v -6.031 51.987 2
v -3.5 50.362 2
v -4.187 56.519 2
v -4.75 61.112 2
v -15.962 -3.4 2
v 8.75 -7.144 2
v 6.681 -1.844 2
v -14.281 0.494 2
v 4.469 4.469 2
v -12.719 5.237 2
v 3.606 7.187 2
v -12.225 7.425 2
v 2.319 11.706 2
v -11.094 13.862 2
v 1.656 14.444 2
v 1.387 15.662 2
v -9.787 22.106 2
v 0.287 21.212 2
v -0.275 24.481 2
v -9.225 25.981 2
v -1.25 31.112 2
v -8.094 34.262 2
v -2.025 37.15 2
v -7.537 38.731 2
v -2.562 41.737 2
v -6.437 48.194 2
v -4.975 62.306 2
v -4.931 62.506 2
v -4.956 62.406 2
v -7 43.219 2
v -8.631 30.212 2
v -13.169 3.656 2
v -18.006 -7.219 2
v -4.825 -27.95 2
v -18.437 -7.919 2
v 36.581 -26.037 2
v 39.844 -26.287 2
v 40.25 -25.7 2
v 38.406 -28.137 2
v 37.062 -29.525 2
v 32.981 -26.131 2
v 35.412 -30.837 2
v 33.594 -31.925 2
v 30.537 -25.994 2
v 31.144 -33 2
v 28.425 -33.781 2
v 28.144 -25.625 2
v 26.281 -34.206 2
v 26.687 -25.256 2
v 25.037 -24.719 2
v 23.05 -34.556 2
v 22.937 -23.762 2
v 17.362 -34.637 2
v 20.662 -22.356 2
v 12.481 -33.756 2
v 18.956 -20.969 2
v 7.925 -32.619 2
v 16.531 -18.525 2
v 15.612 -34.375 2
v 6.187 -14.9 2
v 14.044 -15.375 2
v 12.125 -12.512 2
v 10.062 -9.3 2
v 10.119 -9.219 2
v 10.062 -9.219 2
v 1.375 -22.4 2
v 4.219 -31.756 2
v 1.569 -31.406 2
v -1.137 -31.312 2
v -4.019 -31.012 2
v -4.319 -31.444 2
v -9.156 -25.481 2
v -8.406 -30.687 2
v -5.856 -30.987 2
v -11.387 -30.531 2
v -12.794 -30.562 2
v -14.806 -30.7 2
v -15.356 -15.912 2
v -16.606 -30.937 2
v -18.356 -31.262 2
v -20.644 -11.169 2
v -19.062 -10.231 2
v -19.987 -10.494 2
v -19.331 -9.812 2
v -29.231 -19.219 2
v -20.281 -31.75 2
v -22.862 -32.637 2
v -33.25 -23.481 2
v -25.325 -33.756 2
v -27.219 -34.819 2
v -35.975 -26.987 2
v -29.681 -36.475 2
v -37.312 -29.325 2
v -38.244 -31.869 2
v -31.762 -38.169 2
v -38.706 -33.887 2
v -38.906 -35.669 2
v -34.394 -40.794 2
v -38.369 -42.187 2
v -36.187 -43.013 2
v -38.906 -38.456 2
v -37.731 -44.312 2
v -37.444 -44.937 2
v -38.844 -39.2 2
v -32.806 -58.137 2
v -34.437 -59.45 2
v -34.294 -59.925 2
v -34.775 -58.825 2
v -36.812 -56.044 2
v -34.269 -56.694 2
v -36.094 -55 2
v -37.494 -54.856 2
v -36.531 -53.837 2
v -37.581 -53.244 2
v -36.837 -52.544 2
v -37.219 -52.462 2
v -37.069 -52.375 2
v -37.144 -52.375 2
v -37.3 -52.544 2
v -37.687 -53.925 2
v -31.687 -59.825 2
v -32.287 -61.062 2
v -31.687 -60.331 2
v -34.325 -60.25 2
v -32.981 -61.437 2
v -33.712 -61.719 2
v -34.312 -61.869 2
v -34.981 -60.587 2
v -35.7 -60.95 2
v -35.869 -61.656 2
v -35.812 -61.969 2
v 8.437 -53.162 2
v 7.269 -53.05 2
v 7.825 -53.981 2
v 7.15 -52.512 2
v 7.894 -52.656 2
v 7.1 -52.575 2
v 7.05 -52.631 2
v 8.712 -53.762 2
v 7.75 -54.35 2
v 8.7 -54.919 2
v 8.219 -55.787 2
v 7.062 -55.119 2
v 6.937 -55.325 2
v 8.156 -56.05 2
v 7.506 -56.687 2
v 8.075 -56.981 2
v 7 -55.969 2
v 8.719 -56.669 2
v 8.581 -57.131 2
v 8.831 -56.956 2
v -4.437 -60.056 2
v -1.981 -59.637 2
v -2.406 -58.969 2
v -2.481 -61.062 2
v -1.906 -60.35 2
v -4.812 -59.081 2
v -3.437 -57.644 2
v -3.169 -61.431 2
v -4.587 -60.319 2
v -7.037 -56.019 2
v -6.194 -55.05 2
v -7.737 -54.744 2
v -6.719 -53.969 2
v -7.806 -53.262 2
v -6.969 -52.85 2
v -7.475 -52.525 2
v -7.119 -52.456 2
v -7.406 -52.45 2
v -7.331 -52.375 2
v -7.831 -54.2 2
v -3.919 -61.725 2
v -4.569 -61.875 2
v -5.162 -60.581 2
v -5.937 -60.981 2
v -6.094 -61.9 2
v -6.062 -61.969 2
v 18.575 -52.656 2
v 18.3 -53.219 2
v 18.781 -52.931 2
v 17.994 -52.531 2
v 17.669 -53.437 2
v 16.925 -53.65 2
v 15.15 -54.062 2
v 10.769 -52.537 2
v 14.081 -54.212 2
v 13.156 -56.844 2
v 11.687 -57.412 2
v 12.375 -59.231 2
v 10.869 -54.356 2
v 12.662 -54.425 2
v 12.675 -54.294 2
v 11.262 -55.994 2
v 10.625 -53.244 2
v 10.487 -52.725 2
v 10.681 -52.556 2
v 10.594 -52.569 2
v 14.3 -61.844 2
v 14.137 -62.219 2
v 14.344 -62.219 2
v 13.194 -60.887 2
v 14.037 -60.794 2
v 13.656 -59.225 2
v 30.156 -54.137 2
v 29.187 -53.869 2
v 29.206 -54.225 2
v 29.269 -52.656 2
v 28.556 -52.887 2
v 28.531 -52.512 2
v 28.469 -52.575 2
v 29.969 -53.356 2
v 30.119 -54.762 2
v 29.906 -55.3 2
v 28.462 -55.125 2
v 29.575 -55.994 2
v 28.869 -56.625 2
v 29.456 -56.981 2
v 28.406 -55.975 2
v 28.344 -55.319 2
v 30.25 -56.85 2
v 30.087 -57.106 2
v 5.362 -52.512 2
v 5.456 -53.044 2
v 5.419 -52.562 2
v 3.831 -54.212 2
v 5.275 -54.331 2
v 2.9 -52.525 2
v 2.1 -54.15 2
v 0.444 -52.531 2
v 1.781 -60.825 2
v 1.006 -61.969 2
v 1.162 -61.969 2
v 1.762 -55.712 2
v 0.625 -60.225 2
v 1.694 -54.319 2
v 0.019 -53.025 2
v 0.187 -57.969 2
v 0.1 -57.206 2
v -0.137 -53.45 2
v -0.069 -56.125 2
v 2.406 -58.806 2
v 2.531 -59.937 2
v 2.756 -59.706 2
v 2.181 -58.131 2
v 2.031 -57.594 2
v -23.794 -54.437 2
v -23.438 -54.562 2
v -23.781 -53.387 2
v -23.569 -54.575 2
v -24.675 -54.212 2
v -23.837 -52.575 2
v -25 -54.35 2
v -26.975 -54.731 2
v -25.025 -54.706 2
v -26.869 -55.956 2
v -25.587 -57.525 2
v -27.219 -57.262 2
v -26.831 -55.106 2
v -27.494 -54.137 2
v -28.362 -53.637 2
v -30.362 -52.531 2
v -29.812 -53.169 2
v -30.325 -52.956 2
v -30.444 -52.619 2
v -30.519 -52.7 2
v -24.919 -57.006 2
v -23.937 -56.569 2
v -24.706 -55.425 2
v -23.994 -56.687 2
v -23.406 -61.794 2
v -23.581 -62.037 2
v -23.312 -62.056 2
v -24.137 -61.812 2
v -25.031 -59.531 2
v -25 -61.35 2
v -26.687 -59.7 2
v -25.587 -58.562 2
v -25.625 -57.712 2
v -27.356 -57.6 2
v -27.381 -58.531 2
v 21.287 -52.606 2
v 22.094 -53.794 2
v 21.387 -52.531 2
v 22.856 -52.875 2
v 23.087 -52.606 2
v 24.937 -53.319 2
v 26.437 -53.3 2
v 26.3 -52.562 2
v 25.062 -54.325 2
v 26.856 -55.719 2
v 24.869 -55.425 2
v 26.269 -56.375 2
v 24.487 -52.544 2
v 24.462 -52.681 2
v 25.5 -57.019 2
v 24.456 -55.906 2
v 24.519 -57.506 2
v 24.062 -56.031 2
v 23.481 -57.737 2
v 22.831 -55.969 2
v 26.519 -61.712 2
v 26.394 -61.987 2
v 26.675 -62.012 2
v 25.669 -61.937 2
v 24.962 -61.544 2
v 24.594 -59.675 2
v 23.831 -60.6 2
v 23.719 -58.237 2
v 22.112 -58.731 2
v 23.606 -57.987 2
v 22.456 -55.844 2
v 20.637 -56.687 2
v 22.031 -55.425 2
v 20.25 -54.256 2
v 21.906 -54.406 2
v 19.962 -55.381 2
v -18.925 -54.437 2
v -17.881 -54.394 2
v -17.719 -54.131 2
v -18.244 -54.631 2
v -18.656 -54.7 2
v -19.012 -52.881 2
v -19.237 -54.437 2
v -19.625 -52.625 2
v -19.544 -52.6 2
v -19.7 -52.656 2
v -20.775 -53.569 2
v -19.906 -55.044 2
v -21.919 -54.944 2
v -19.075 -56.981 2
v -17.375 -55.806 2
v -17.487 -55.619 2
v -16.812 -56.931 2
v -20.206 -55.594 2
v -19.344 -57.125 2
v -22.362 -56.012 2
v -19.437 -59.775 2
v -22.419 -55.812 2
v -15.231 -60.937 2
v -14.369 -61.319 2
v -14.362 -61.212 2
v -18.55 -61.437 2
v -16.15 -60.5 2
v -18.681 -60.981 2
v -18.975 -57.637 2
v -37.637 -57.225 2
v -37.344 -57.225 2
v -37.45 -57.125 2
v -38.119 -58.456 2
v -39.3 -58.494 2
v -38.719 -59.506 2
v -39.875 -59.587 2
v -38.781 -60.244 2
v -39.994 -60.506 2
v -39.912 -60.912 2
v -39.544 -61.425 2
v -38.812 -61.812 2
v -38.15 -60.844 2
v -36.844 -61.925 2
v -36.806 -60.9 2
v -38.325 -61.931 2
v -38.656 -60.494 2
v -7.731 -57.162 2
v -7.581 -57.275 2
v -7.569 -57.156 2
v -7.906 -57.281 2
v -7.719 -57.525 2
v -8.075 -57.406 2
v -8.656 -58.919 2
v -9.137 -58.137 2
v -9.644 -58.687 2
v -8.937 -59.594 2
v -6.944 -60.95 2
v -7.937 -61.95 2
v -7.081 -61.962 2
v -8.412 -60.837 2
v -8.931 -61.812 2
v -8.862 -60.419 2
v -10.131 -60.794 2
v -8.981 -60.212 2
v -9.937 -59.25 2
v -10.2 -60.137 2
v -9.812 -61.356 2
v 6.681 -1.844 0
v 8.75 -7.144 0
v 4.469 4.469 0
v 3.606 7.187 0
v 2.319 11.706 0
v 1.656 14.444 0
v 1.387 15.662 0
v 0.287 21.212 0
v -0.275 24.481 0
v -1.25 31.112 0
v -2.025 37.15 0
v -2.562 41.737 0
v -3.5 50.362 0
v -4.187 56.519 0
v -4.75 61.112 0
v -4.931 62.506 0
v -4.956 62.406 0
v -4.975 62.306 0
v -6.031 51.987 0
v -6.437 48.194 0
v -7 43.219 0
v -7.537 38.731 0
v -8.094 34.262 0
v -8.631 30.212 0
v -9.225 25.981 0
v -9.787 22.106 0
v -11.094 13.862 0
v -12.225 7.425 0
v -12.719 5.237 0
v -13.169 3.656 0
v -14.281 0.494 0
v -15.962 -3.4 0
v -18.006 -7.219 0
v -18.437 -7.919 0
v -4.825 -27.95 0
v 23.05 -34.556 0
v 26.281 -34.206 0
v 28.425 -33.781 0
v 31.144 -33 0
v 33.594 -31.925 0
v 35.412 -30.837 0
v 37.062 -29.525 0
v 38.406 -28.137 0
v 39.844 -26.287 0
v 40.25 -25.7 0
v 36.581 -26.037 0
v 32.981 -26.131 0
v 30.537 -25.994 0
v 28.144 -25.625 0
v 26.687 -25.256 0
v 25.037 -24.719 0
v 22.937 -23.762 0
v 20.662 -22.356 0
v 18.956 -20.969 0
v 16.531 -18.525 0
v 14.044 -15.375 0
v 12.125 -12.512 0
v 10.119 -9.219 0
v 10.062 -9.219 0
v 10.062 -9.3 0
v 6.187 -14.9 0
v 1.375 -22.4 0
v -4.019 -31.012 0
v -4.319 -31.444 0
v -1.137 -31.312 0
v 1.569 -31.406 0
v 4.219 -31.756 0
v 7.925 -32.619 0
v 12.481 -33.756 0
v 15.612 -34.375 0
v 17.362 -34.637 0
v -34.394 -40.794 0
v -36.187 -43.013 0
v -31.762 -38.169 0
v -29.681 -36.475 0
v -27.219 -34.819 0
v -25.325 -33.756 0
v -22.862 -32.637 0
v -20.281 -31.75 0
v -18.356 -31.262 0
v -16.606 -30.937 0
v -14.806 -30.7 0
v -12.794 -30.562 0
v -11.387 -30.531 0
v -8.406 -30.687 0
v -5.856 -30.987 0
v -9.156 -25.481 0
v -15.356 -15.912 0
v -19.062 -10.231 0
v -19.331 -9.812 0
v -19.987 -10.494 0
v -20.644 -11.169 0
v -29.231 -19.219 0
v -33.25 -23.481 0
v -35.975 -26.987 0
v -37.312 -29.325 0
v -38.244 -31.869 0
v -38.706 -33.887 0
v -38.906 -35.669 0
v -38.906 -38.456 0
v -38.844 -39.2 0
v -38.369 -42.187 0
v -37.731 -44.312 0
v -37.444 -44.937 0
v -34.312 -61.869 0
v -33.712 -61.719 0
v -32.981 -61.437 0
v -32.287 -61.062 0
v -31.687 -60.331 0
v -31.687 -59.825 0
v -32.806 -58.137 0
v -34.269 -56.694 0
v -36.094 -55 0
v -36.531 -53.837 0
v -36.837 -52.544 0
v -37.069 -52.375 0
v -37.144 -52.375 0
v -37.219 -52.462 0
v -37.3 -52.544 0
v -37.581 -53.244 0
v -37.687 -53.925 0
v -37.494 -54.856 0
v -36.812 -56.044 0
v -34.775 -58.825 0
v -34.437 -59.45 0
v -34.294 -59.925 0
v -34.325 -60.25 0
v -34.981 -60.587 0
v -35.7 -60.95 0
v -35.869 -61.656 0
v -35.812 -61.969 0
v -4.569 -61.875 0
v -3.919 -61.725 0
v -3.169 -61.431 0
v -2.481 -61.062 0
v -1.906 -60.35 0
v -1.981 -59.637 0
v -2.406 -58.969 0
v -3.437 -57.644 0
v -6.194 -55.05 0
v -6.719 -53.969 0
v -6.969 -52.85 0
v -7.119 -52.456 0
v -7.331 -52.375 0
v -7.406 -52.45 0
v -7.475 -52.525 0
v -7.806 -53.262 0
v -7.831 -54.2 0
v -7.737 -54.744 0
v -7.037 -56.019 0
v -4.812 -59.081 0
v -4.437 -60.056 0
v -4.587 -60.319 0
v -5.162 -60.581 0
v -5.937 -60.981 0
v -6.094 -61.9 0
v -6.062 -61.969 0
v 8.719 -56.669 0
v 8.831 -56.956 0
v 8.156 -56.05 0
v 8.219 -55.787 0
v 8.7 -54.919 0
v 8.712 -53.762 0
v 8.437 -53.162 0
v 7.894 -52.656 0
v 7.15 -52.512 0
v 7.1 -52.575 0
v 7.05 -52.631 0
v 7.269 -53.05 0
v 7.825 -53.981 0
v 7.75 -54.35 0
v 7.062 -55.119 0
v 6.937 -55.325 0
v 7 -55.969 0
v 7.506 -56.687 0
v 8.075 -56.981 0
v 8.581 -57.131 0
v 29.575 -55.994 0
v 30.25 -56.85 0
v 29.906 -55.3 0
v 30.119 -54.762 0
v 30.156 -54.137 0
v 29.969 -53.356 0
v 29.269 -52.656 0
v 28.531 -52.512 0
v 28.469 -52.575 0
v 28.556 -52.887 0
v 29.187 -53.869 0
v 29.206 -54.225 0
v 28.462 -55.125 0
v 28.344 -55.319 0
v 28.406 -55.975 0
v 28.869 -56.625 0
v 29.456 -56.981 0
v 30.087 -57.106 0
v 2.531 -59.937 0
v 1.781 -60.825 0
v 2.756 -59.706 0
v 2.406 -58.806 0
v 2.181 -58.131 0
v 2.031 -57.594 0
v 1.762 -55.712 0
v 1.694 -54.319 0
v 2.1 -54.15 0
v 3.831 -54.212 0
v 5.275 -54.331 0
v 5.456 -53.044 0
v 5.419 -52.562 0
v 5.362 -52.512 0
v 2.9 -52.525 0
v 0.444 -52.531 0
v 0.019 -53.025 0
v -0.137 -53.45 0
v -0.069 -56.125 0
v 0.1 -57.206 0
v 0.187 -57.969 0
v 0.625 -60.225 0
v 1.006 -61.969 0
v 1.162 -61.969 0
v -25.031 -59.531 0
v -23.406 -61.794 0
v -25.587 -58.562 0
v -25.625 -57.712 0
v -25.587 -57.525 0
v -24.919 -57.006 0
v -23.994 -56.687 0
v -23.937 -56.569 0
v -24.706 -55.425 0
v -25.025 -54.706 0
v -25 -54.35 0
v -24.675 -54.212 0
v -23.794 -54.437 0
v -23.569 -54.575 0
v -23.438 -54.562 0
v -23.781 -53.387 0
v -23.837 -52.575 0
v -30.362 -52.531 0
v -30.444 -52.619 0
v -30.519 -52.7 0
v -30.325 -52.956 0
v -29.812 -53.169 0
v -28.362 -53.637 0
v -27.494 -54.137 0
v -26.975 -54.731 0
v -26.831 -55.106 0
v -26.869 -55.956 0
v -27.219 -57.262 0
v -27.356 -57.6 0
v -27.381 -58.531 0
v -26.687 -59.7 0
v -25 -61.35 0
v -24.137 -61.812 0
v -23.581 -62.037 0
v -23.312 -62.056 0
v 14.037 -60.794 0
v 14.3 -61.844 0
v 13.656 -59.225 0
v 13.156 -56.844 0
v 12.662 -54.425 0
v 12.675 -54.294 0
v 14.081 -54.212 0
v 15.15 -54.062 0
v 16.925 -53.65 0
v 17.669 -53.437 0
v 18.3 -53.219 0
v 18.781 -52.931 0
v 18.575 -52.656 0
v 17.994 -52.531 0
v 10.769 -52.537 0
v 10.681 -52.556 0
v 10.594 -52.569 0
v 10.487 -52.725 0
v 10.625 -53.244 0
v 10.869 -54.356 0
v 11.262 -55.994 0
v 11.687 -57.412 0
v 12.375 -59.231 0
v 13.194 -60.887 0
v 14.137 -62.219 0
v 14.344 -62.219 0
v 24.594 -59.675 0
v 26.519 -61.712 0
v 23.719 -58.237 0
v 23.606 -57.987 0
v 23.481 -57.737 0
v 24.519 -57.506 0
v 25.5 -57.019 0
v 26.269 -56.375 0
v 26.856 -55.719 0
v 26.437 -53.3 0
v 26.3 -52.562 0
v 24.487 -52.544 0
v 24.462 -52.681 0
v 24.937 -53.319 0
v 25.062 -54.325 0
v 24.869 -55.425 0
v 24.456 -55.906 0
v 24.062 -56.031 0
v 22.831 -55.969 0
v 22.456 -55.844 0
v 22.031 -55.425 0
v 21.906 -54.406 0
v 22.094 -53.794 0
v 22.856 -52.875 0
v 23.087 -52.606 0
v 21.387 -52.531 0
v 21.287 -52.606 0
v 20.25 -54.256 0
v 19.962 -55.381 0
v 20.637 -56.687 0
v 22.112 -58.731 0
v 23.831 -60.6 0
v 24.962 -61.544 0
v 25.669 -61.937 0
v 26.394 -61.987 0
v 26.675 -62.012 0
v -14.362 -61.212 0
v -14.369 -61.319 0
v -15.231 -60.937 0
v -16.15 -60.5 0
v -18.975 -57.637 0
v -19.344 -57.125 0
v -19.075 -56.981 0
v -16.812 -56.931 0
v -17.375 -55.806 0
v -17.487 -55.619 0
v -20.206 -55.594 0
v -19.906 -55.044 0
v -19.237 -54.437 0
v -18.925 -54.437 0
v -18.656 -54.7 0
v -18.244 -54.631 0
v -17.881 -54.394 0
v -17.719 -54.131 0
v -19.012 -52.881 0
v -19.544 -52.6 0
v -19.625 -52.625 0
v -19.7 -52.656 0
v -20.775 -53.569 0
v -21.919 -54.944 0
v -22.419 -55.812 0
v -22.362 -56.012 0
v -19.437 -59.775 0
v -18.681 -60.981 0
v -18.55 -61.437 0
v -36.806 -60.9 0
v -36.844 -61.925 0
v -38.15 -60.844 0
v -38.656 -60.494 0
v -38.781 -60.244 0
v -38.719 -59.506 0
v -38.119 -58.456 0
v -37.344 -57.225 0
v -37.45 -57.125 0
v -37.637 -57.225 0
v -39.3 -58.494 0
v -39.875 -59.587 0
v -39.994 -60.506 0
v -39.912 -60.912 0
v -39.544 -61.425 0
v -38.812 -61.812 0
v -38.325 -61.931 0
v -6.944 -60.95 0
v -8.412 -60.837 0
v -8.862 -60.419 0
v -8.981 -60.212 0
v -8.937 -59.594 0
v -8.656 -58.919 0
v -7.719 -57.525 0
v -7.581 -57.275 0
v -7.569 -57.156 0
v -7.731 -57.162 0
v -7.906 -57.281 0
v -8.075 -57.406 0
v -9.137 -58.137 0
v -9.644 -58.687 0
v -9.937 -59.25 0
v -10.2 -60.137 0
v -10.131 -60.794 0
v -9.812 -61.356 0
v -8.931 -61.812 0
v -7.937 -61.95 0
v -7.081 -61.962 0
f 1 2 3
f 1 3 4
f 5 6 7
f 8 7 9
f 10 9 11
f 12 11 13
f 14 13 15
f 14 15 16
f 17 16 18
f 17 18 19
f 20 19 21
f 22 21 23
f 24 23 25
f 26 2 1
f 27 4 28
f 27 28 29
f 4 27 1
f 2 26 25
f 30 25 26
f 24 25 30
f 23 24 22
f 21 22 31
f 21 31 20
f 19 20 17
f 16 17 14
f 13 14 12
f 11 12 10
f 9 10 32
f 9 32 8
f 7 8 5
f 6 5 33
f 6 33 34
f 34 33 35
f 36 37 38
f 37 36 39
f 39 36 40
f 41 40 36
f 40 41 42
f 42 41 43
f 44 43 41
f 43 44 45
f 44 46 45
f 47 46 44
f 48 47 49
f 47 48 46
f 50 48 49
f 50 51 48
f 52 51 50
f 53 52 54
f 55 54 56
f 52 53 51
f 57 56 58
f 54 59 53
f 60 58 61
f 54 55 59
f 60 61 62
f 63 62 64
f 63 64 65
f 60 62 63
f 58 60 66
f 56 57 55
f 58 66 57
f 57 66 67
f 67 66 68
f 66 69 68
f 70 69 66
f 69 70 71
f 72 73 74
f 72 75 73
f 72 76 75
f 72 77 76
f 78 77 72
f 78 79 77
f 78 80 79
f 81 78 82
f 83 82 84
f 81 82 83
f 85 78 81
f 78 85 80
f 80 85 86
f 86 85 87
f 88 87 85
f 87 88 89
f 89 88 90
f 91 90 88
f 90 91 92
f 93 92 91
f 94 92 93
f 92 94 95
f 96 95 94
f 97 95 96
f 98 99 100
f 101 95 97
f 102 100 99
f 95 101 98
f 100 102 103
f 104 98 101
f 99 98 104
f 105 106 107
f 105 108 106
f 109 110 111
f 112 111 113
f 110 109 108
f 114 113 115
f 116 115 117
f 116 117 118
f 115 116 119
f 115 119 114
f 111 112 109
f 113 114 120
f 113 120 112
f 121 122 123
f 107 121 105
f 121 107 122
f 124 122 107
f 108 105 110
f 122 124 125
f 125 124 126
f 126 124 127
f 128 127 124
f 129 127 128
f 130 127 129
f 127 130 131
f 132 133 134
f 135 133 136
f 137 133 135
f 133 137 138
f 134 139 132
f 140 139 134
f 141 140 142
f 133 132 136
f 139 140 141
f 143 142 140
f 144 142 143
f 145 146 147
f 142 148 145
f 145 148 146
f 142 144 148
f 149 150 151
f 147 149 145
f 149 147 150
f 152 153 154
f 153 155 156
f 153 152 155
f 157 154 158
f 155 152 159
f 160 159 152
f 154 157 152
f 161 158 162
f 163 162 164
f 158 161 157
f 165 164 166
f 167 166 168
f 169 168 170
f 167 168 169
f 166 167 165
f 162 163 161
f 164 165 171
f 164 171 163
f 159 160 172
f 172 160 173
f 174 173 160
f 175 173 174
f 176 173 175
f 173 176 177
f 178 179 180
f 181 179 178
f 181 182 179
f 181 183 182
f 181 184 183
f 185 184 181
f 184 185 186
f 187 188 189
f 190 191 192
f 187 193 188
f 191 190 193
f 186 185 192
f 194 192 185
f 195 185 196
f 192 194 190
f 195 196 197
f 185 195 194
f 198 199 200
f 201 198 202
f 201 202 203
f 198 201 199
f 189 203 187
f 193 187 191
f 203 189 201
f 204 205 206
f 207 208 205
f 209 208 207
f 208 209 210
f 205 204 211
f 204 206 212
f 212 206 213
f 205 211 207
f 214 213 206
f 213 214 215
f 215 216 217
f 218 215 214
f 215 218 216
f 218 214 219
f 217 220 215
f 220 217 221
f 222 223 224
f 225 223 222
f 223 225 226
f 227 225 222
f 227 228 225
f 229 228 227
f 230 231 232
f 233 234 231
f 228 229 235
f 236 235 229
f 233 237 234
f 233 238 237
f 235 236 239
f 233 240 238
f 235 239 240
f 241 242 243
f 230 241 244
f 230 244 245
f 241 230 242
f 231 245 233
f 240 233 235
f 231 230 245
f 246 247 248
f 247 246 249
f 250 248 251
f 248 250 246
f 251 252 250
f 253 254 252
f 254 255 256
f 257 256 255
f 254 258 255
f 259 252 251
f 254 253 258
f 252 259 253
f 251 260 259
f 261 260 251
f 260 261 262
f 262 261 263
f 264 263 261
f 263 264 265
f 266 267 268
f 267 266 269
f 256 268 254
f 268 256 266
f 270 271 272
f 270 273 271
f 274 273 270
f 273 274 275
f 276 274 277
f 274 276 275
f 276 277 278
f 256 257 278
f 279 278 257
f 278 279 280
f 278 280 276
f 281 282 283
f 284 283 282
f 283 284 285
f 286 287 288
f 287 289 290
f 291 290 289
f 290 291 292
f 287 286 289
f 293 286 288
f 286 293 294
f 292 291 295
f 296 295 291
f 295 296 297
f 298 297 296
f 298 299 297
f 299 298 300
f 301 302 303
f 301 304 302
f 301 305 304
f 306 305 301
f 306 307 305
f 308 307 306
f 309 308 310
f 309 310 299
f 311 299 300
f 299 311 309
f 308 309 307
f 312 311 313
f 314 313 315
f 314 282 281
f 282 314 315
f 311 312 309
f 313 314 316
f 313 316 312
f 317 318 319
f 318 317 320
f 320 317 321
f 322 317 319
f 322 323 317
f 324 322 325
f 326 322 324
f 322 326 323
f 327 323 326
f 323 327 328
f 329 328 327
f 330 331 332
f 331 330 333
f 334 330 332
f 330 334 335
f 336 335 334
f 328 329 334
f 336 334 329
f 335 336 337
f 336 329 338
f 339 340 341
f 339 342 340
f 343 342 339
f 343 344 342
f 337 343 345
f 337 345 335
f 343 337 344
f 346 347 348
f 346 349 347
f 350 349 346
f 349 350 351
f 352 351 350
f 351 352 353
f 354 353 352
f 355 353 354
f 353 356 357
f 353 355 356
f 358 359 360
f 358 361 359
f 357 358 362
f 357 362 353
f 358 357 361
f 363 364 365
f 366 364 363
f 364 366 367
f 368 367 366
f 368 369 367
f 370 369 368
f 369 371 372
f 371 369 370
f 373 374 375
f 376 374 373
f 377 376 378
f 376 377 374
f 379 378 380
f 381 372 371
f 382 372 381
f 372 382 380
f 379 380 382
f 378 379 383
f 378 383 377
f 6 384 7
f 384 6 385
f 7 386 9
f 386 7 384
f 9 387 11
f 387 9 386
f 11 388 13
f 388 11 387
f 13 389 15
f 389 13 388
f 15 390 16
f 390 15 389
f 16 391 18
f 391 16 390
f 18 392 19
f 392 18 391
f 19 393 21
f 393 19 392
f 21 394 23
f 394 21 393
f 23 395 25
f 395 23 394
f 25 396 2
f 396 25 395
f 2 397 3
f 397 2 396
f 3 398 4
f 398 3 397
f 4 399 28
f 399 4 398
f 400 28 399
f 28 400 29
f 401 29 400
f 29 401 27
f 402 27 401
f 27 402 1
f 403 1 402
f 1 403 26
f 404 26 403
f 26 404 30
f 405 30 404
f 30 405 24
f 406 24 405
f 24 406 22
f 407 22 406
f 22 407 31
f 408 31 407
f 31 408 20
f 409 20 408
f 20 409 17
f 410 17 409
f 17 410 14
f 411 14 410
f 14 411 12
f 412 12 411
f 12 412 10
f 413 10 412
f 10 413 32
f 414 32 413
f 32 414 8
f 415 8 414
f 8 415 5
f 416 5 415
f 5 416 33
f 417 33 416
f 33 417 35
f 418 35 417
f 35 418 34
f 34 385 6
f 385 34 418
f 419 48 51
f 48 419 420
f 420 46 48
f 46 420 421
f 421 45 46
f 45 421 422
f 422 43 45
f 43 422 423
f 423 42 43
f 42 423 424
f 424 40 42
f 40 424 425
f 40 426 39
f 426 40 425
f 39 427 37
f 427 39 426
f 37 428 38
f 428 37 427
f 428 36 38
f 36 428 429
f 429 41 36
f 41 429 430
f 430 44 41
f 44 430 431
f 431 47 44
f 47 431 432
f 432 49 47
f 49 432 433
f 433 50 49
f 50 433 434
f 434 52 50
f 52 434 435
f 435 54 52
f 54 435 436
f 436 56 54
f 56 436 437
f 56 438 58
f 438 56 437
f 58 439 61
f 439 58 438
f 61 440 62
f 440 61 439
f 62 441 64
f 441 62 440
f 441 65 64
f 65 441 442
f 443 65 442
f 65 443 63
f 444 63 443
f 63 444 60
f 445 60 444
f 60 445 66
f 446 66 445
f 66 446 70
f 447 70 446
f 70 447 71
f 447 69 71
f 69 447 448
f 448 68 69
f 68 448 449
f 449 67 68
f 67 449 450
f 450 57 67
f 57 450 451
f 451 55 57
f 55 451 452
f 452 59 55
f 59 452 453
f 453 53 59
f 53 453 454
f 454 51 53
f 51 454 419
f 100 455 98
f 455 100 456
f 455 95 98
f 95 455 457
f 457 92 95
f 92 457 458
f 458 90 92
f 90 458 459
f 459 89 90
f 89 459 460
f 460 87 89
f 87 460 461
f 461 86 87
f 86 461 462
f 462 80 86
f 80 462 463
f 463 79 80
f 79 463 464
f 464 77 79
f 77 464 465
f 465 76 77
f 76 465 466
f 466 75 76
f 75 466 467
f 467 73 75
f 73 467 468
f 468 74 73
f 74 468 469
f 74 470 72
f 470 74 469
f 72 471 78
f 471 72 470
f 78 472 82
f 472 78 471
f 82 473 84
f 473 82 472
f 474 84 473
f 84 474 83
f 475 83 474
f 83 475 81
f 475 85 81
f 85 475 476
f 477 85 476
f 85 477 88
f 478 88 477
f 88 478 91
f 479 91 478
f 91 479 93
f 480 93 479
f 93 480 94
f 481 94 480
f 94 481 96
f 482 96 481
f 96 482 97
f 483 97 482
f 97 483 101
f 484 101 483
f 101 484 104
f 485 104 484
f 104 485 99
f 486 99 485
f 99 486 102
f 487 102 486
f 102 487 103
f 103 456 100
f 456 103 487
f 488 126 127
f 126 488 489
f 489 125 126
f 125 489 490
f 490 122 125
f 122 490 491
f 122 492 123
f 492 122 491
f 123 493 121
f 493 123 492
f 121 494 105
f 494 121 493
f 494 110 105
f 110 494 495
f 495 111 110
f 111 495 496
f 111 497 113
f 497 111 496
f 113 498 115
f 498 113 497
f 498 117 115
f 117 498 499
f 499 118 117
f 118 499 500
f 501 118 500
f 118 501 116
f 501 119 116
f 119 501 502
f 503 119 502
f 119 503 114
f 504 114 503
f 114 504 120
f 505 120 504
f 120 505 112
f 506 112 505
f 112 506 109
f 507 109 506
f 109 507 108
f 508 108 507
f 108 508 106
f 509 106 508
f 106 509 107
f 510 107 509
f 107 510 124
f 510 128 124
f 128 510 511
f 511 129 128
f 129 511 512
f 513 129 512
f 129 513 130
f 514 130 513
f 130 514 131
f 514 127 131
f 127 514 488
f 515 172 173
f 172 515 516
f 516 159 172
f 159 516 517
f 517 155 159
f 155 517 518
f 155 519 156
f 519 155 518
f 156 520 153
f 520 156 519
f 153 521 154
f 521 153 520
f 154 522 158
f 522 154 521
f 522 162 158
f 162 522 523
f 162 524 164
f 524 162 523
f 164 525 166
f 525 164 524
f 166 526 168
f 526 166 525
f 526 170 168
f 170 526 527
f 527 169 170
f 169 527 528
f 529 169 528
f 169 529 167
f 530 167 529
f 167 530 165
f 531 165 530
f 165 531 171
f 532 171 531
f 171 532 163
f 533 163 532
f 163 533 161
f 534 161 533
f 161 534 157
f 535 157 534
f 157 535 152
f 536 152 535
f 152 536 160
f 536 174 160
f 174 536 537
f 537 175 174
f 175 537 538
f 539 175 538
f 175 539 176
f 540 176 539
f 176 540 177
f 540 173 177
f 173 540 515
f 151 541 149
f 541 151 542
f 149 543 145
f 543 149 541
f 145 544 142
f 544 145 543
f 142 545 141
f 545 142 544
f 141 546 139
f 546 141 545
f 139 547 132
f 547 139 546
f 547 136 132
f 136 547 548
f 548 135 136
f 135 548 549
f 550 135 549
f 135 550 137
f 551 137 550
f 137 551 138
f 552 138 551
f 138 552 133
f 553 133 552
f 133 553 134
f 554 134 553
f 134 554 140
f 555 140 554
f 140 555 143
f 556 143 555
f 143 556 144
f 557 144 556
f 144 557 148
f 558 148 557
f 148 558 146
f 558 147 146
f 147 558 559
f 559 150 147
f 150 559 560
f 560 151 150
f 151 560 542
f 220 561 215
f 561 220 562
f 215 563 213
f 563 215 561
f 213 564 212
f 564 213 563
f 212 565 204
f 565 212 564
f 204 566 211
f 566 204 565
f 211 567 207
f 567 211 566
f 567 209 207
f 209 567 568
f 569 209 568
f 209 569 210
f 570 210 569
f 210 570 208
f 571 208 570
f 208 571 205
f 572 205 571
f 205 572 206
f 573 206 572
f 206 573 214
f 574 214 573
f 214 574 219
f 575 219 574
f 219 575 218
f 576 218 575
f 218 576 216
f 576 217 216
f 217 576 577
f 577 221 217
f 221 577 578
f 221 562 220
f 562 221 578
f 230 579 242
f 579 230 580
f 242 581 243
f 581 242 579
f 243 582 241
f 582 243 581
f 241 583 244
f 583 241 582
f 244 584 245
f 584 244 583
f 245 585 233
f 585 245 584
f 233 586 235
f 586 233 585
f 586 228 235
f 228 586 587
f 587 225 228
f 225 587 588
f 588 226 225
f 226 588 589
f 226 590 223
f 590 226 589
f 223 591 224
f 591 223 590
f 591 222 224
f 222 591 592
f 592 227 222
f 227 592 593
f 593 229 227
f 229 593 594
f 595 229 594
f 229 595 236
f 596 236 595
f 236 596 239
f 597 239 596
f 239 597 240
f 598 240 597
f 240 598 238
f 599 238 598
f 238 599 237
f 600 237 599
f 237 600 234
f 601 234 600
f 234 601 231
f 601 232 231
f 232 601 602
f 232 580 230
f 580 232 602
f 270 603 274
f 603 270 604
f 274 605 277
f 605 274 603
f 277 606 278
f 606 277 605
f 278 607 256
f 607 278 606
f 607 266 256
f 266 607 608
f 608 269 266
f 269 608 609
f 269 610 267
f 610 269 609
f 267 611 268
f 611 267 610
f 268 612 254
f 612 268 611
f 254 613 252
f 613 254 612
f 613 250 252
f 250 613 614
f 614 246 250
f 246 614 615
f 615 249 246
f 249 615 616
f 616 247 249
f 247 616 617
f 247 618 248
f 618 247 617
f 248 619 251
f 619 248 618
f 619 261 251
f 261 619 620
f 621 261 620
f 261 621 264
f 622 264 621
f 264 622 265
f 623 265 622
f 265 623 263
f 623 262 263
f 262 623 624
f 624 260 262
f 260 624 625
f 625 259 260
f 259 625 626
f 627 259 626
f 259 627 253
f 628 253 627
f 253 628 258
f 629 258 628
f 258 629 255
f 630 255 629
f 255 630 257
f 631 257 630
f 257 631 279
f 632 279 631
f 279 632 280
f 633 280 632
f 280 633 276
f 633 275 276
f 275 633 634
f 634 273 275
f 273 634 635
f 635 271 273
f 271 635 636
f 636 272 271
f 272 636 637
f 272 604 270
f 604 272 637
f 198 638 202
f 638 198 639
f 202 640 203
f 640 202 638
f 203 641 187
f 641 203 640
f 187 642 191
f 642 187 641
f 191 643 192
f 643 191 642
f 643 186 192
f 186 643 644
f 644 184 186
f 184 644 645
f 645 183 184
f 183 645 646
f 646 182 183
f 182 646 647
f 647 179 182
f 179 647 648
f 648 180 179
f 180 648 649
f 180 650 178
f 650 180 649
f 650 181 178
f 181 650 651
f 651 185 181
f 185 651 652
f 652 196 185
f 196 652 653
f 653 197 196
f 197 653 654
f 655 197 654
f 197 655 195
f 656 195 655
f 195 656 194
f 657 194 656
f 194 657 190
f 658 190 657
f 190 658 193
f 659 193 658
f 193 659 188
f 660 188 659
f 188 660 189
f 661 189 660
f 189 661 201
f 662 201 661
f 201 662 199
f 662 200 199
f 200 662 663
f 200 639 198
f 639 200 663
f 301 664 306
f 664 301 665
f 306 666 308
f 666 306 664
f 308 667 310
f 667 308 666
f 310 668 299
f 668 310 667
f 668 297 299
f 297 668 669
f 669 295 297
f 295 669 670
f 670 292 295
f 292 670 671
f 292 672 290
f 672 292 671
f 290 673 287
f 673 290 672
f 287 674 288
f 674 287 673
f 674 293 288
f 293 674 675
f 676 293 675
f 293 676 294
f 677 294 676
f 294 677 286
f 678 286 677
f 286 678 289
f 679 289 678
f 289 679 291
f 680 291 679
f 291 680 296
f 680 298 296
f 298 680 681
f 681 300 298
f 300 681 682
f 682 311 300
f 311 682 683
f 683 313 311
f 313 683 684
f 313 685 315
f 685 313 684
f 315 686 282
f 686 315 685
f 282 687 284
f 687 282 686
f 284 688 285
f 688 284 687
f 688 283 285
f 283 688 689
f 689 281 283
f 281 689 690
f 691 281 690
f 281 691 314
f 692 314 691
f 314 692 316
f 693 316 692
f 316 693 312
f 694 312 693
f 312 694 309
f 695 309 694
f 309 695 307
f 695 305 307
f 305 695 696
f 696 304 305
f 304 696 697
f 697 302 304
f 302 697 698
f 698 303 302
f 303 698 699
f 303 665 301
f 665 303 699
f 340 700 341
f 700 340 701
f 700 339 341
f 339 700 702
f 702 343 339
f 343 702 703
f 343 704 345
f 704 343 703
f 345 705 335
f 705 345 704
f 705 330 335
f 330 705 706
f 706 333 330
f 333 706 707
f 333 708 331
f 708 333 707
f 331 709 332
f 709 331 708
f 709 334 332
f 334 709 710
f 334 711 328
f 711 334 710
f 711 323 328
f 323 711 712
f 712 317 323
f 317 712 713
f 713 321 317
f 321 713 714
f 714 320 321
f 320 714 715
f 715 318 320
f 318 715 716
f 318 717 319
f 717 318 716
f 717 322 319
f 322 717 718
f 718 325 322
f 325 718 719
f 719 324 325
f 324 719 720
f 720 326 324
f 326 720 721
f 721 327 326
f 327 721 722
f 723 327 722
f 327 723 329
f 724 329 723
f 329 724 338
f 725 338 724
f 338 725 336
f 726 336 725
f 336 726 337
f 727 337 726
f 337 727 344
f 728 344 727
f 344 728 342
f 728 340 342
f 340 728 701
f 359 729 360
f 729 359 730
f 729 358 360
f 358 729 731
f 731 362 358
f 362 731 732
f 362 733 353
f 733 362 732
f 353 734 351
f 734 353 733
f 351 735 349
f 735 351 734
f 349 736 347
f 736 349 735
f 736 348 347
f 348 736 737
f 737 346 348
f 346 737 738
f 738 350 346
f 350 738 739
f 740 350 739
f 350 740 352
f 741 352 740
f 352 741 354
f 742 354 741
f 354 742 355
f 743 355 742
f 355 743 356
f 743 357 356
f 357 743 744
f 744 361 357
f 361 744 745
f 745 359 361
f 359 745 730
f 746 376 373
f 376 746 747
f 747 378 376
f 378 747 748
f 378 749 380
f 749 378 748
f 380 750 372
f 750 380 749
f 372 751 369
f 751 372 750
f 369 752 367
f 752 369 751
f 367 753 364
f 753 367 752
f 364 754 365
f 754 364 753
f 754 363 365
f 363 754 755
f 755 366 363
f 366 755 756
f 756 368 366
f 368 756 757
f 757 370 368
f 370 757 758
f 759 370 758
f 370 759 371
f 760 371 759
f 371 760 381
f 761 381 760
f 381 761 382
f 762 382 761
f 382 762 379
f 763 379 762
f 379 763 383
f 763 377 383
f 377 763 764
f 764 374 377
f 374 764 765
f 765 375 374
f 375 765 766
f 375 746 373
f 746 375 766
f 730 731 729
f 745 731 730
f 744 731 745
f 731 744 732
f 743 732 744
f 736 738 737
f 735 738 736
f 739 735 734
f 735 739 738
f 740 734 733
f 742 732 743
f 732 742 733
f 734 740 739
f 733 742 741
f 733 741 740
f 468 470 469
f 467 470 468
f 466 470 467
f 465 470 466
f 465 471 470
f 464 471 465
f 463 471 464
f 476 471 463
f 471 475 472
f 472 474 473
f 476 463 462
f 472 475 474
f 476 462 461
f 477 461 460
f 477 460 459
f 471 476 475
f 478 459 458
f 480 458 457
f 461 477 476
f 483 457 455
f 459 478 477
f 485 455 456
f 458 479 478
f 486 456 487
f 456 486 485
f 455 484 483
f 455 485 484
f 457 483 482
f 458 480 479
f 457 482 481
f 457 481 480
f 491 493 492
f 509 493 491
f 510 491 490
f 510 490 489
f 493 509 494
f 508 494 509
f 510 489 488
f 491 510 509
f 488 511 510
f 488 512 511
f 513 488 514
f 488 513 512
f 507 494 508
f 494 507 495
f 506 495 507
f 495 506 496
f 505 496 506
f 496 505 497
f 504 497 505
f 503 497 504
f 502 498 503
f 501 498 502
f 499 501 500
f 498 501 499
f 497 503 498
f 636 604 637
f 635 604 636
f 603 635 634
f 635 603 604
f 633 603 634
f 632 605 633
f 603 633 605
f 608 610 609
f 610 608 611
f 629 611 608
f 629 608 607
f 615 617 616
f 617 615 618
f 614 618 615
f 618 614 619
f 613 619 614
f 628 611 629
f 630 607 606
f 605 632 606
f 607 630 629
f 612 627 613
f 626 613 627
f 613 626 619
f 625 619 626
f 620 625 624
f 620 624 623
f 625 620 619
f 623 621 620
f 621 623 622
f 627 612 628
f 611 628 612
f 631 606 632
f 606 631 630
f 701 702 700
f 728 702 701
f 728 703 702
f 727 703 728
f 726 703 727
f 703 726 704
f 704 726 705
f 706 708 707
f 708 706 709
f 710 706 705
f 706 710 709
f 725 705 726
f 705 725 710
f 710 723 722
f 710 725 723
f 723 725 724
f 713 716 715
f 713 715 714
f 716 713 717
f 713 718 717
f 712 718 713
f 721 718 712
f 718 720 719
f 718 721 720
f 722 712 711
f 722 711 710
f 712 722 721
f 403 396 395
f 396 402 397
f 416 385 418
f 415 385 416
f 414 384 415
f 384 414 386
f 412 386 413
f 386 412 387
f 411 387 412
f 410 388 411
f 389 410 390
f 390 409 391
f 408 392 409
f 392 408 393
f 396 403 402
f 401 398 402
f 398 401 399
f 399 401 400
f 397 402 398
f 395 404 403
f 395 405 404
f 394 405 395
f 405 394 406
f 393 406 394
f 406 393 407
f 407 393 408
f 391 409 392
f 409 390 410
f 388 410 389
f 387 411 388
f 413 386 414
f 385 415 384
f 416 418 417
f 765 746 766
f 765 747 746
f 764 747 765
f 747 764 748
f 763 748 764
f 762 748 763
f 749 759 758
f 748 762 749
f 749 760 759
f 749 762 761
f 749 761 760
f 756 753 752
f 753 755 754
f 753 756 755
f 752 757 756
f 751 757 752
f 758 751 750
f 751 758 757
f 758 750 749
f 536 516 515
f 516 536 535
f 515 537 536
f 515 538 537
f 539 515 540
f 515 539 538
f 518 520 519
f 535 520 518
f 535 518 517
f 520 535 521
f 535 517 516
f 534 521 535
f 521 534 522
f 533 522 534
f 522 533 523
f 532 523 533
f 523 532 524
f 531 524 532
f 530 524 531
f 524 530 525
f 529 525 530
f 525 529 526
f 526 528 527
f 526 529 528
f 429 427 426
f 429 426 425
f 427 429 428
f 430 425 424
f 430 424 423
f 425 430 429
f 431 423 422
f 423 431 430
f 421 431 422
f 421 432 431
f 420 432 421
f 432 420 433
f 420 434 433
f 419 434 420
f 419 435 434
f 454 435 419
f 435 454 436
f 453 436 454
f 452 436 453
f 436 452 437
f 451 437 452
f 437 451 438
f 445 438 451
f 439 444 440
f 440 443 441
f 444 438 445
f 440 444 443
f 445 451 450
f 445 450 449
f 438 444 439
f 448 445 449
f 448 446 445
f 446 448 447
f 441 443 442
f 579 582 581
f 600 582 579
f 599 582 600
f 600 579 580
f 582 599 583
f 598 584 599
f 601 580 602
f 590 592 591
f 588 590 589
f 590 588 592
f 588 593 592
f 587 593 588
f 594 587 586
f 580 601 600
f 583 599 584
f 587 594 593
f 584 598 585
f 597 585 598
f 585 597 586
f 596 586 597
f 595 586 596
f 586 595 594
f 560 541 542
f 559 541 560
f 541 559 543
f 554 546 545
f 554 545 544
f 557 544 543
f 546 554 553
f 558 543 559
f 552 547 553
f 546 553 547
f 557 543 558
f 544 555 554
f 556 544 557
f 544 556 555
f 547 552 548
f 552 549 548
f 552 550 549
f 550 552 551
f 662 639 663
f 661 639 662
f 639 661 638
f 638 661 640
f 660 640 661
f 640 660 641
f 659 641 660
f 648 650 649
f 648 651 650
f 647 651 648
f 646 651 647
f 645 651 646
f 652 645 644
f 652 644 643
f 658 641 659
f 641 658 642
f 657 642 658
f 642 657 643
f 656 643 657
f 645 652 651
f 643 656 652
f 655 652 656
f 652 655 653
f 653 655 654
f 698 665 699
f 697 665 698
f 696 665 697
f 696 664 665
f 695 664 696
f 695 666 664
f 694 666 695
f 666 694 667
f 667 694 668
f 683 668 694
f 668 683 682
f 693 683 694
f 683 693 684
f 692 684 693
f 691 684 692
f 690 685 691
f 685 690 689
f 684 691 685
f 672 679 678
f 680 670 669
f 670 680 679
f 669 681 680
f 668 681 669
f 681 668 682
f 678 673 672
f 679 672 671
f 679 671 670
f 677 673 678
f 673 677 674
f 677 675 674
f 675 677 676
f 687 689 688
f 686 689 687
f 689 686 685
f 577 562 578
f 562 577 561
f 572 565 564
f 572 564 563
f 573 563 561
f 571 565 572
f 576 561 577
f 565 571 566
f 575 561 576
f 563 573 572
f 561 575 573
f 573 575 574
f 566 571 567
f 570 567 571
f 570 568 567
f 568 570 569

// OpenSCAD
module 2f66784dafeb8287964889e6252a5895_1()
{
 /* Generated by trace2scad version 20150415
    http://aggregate.org/MAKE/TRACE2SCAD/
    Optimized model has 387/4796 original points
 */
 color([0.48, 0.48, 0.48])
 assign(minx=0) /* polygon minx=39 */
 assign(miny=0) /* polygon miny=45 */
 assign(maxx=12880) /* polygon maxx=12880 */
 assign(maxy=20000) /* polygon maxy=20001 */
 assign(dx=maxx-minx)
 assign(dy=maxy-miny)
 assign(maxd=((dx>dy)?dx:dy))
 scale([1/maxd, 1/maxd, 1])
 translate([-minx-dx/2, -miny-dy/2, 0])
 linear_extrude(height=1, convexity=387)
 union() {
  union() {
   polygon([[5647,19985],[5644,19969],[5475,18318],[5410,17711],[5320,16915],[5234,16197],[5145,15482],[5059,14834],[4964,14157],[4874,13537],[4665,12218],[4484,11188],[4405,10838],[4333,10585],[4155,10079],[3886,9456],[3559,8845],[3490,8733],[5668,5528],[7840,8857],[7509,9705],[7155,10715],[7017,11150],[6811,11873],[6705,12311],[6662,12506],[6486,13394],[6396,13917],[6240,14978],[6116,15944],[6030,16678],[5880,18058],[5770,19043],[5680,19778],[5651,20001]], convexity=6);
   polygon([[8050,8518],[8050,8512],[7430,7616],[6660,6416],[5797,5038],[5749,4969],[6258,4990],[6691,4975],[7115,4919],[7708,4781],[8437,4599],[8938,4500],[9218,4458],[10128,4471],[10645,4527],[10988,4595],[11423,4720],[11815,4892],[12106,5066],[12370,5276],[12585,5498],[12815,5794],[12880,5888],[12293,5834],[11717,5819],[11326,5841],[10943,5900],[10710,5959],[10446,6045],[10110,6198],[9746,6423],[9473,6645],[9085,7036],[8687,7540],[8380,7998],[8059,8525],[8050,8525]], convexity=9);
   polygon([[3242,8321],[3137,8213],[1763,6925],[1120,6243],[684,5682],[470,5308],[321,4901],[247,4578],[215,4293],[215,3847],[225,3728],[301,3250],[403,2910],[449,2810],[650,3118],[937,3473],[1358,3893],[1691,4164],[2085,4429],[2388,4599],[2782,4778],[3195,4920],[3503,4998],[3783,5050],[4071,5088],[4393,5110],[4618,5115],[5095,5090],[5503,5042],[4975,5923],[3983,7454],[3390,8363],[3347,8430]], convexity=7);
   polygon([[485,1606],[472,1593],[427,1481],[410,1372],[441,1223],[550,1033],[876,588],[930,488],[953,412],[948,360],[843,306],[728,248],[701,135],[710,85],[950,101],[1046,125],[1163,170],[1274,230],[1370,347],[1370,428],[1191,698],[957,929],[665,1200],[595,1386],[546,1593],[509,1620],[497,1620]], convexity=8);
   polygon([[5255,1608],[5244,1596],[5191,1478],[5187,1328],[5202,1241],[5314,1037],[5670,547],[5730,391],[5706,349],[5614,307],[5490,243],[5465,96],[5470,85],[5709,100],[5813,124],[5933,171],[6043,230],[6135,344],[6123,458],[6055,565],[5890,777],[5449,1192],[5365,1365],[5325,1544],[5301,1607],[5267,1620]], convexity=8);
   polygon([[6904,1596],[6511,1595],[6443,1516],[6418,1448],[6429,1020],[6456,847],[6470,725],[6540,364],[6601,85],[6626,85],[6725,268],[6845,410],[6881,447],[6825,591],[6789,699],[6765,785],[6722,1086],[6711,1309],[6776,1336],[7053,1326],[7284,1307],[7313,1513],[7307,1590],[7298,1598]], convexity=10);
   polygon([[7576,1588],[7568,1579],[7603,1512],[7692,1363],[7680,1304],[7570,1181],[7550,1148],[7560,1045],[7641,930],[7732,883],[7813,859],[7853,887],[7835,933],[7745,1032],[7755,1074],[7832,1213],[7834,1398],[7790,1494],[7703,1575],[7584,1598]], convexity=10);
   polygon([[11000,1593],[10995,1588],[11009,1538],[11110,1381],[11113,1324],[10994,1180],[10975,1149],[10985,1044],[11059,940],[11153,883],[11254,863],[11280,904],[11172,1041],[11225,1152],[11259,1238],[11265,1338],[11235,1463],[11123,1575],[11005,1598]], convexity=10);
   polygon([[1569,1581],[1557,1568],[1588,1527],[1670,1493],[1902,1418],[2041,1338],[2124,1243],[2147,1183],[2141,1047],[2085,838],[2063,784],[2059,635],[2170,448],[2440,184],[2578,110],[2667,74],[2710,71],[2695,113],[2435,475],[2346,630],[2340,766],[2346,796],[2453,879],[2601,930],[2610,949],[2487,1132],[2436,1247],[2440,1304],[2492,1326],[2633,1290],[2669,1268],[2690,1270],[2635,1458],[2626,1588],[1582,1595]], convexity=13);
   polygon([[8149,1591],[8135,1589],[8118,1564],[8140,1481],[8179,1303],[8242,1041],[8310,814],[8420,523],[8551,258],[8702,45],[8735,45],[8728,105],[8686,273],[8625,524],[8545,905],[8466,1292],[8468,1313],[8693,1326],[8864,1350],[9148,1416],[9267,1450],[9368,1485],[9445,1531],[9412,1575],[9319,1595],[8163,1594]], convexity=9);
   polygon([[9854,1589],[9846,1583],[9680,1319],[9634,1139],[9742,930],[9978,603],[10253,304],[10434,153],[10547,90],[10663,82],[10708,78],[10683,126],[10375,452],[10235,682],[10217,722],[10197,762],[10363,799],[10520,877],[10643,980],[10737,1085],[10670,1472],[10648,1590],[10358,1593],[10354,1571],[10430,1469],[10450,1308],[10419,1132],[10353,1055],[10290,1035],[10093,1045],[10033,1065],[9965,1132],[9945,1295],[9975,1393],[10097,1540],[10134,1583],[9862,1595]], convexity=13);
   polygon([[3300,1580],[3288,1575],[3116,1429],[2933,1209],[2853,1070],[2862,1038],[3330,436],[3451,243],[3472,170],[4141,189],[4142,206],[4003,250],[3856,320],[3404,778],[3345,860],[3388,883],[3750,891],[3660,1071],[3642,1101],[3207,1105],[3255,1193],[3362,1290],[3412,1290],[3455,1248],[3521,1259],[3579,1297],[3605,1339],[3398,1539],[3313,1584]], convexity=12);
   polygon([[433,852],[418,844],[152,641],[60,466],[41,319],[54,254],[113,172],[230,110],[308,91],[545,92],[551,256],[336,265],[255,321],[235,361],[245,479],[341,647],[465,844],[448,860]], convexity=8);
   polygon([[5175,835],[5148,815],[4978,698],[4897,610],[4850,520],[4808,378],[4819,273],[4870,183],[5011,110],[5170,88],[5307,86],[5329,248],[5094,266],[5022,333],[5003,366],[5010,465],[5055,573],[5205,796],[5227,836],[5229,855],[5203,854]], convexity=8);
  }
 }
}

module 2f66784dafeb8287964889e6252a5895()
{
 /* all layers combined, scaled to within a 1mm cube */
 scale([1, 1, 1/1])
 difference() {
  union() {
   scale([1,1,2]) translate([0,0,-0.5]) 2f66784dafeb8287964889e6252a5895_1();
  }
  translate([0,0,-2]) cube([2,2,4],center=true);
 }
}

scale([125, 125, 2]) {
	2f66784dafeb8287964889e6252a5895();
}
